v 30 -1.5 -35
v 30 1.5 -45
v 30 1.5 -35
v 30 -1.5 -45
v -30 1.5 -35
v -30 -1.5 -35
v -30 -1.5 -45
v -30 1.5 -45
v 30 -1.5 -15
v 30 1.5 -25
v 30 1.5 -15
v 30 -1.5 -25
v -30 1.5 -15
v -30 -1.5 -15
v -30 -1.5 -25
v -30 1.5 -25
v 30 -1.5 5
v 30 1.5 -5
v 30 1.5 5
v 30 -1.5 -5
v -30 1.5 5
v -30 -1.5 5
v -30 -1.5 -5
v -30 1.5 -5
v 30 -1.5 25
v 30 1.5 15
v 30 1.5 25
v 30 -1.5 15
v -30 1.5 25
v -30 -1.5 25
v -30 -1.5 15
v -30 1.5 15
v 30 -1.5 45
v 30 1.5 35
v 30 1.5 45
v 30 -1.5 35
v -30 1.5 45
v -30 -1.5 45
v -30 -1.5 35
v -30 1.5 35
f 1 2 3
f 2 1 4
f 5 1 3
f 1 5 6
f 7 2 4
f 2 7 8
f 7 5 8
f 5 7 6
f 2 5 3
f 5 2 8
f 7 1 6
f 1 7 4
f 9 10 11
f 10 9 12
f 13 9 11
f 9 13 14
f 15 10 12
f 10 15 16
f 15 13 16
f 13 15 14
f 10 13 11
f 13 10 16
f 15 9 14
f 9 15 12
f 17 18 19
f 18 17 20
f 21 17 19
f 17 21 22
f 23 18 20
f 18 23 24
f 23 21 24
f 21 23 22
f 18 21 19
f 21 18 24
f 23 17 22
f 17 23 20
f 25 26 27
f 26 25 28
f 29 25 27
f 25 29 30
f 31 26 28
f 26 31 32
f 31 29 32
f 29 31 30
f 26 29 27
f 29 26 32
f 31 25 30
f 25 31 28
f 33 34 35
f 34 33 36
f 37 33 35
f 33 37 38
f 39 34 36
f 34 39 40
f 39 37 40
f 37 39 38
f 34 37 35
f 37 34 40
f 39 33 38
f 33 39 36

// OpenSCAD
// Library: blockouts.scad
// Version: 1.0.0
// Author: David Bowers
// Copyright: 2022
// License: 2-clause BSD License (http://opensource.org/licenses/BSD-2-Clause)

// Will render an evenly distibuted set of blocks.
//
// blockouts(thickness:int, length:int, width:int, count); 
//


module blockouts (thickness=3, length=60, width=10, count=5){
    size = [length, thickness, width];
    ctrz = width*(count-1);
    center = [0,0,-ctrz];
    translate(center){
    for ( i = [0:count-1]){
        loc = [0, 0, i*width*2];
        translate(loc)
            cube(size, center=true);
    }
}
}

blockouts();
